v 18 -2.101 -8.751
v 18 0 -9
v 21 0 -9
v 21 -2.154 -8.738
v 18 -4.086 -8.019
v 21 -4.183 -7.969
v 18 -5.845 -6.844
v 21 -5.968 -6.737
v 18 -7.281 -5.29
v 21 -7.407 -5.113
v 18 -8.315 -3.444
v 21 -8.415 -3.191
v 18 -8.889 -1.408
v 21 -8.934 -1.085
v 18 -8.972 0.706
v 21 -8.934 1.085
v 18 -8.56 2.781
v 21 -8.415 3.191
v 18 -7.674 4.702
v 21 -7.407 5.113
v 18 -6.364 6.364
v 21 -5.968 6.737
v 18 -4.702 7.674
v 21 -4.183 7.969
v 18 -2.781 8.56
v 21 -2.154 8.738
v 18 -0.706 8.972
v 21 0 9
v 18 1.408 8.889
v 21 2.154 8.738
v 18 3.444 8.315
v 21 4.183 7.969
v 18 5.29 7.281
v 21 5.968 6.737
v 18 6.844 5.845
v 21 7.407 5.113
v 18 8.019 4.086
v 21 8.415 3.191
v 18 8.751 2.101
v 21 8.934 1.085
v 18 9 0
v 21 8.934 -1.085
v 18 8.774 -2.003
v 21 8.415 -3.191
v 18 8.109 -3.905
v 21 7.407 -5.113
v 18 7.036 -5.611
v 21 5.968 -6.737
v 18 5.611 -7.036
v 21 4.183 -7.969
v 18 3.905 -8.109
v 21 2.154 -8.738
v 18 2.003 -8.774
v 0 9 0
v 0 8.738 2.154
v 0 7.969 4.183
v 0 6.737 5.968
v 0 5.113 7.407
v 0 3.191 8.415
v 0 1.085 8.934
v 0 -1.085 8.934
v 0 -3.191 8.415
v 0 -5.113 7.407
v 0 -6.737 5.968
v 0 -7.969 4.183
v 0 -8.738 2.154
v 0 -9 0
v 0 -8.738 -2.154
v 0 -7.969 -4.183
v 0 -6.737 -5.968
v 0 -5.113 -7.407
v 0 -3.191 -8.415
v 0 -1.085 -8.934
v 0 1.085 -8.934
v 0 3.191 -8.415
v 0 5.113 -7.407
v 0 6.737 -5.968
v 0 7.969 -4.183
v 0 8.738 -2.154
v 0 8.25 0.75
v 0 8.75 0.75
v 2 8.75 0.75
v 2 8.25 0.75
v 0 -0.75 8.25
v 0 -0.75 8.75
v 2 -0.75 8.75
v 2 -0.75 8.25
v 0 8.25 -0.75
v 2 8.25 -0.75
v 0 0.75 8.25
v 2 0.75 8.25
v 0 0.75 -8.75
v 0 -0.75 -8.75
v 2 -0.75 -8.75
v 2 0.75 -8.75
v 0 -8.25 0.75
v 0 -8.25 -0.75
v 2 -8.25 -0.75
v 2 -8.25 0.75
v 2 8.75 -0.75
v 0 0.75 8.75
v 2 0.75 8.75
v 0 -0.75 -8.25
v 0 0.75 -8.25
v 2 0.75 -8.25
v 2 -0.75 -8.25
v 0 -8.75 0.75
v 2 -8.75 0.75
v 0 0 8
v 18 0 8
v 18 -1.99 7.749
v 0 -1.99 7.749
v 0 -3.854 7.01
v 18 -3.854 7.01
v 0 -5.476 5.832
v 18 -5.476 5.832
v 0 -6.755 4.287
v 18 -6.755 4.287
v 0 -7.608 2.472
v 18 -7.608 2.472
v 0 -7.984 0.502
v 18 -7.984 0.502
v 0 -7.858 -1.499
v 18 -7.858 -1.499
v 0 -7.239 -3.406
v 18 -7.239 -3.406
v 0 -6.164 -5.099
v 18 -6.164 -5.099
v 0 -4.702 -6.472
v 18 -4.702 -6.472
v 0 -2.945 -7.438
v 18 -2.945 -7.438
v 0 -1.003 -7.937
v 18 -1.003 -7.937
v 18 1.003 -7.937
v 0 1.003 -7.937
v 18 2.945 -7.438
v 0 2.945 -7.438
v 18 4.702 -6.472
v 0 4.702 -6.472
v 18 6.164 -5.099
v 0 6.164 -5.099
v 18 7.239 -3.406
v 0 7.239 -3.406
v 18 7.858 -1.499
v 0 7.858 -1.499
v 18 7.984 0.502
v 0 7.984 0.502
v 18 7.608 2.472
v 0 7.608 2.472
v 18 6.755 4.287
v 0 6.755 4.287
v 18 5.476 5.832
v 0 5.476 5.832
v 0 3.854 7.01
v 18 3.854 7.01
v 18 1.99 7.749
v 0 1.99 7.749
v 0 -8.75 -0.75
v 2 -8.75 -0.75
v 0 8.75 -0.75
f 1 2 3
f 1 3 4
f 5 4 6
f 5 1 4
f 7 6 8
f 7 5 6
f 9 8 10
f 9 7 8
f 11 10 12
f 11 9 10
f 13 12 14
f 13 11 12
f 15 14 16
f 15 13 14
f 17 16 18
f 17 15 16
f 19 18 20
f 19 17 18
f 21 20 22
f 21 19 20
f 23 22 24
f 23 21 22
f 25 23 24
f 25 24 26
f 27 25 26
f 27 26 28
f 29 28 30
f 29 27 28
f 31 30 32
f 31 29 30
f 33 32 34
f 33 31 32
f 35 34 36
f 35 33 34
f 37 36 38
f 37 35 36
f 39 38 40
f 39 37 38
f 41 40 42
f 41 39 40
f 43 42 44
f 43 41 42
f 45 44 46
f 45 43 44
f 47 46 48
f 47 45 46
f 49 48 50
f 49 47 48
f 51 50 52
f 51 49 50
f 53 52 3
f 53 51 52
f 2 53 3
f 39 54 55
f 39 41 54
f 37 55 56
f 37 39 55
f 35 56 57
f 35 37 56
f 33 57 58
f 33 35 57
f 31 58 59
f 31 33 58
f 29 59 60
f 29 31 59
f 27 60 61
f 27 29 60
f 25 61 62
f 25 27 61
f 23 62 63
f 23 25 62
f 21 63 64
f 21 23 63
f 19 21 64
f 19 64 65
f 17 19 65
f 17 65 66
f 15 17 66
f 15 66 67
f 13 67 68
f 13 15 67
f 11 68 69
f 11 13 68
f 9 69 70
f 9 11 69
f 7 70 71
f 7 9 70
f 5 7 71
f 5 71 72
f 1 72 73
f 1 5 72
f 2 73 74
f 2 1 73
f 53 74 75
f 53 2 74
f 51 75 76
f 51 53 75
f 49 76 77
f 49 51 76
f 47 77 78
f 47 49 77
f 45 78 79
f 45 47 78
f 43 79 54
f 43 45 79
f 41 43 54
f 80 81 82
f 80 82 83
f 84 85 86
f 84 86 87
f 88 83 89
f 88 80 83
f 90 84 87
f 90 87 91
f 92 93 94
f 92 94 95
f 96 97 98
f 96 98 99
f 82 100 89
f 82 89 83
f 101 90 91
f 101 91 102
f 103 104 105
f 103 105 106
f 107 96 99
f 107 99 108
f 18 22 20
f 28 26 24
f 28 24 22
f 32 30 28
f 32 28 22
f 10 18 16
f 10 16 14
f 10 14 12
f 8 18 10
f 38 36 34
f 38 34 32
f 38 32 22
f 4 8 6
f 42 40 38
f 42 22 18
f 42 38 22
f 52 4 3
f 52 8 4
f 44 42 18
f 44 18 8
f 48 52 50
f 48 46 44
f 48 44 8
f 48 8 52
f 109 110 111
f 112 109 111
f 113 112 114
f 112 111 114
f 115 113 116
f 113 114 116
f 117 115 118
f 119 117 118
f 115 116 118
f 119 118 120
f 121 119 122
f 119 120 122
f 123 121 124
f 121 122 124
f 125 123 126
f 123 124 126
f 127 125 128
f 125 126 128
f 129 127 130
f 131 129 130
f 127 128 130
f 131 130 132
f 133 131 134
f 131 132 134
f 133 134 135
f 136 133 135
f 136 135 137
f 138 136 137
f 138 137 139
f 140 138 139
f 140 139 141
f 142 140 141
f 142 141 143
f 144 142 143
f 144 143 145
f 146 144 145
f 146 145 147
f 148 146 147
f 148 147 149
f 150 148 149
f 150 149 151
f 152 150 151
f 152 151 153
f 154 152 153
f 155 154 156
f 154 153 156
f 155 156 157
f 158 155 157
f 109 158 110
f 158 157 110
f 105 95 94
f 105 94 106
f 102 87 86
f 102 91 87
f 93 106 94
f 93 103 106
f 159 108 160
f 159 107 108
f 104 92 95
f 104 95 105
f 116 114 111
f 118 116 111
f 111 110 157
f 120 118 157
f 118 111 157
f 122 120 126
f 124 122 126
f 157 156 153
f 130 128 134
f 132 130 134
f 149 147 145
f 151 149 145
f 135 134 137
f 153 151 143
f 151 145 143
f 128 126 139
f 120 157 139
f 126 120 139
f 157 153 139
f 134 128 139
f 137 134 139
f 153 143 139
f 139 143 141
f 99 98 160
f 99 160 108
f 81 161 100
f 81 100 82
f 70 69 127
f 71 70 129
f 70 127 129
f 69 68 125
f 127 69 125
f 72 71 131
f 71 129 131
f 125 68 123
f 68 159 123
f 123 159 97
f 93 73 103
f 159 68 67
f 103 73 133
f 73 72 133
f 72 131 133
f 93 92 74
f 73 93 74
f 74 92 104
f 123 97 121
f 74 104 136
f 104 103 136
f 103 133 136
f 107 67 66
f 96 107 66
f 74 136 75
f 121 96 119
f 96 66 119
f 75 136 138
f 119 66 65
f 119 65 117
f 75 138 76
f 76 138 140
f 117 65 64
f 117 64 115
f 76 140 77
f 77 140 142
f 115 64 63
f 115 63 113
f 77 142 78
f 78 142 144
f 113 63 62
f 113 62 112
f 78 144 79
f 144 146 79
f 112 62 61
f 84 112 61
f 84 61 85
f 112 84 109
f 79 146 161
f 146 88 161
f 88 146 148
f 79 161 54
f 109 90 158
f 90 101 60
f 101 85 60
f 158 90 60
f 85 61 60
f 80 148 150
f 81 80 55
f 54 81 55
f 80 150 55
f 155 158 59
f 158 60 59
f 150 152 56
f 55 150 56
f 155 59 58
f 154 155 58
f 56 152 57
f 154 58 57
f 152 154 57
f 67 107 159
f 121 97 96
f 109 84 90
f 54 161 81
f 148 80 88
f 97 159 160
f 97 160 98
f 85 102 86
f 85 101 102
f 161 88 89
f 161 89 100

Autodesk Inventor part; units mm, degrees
ref_plane "YZ Plane" through (0, 0, 0) normal (1, 0, 0) x (0, 1, 0)
ref_plane "XZ Plane" through (0, 0, 0) normal (0, 1, 0) x (-1, 0, 0)
ref_plane "XY Plane" through (0, 0, 0) normal (0, 0, 1) x (1, 0, 0)
sketch "Sketch1" plane through (0, 0, 0) normal (0, 0, 1) x (1, 0, 0)
  line L0 (0, 0) -> (18, 0)
  line L1 (0, 0) -> (0, 9)
  line L2 (0, 9) -> (18, 9)
  line L3 (18, 9) -> (18, 0)
  dimension "d2" = 18
revolve "Revolution1" add sketch "Sketch1" angle 360 about axis through (0, 0, 0) along (1, 0, 0)
sketch "Sketch2" plane through (0, 0, 0) normal (-1, 0, 0) x (0, 0, 1)
  circle A0 centre (0, 0) radius 8
  circle A1 centre (0, 0) radius 9 projected
  dimension "d4" = 18
  dimension "d5" = 16
hole "Hole1" at (0, 0, 0) direction (1, 0, 0) diameter 16 end through all
sketch "Sketch3" plane through (18, 0, 0) normal (1, 0, 0) x (0, 0, -1)
  circle A0 centre (0, 0) radius 9
  circle A1 centre (0, 0) radius 9 projected
  dimension "d13" = 18
  dimension "d14" = 18
extrude "Extrusion1" add sketch "Sketch3" along normal blind 3
sketch "Sketch4" plane through (0, 0, 0) normal (-1, 0, 0) x (0, 0, 1)
  circle A0 centre (0, 0) radius 9 projected
  circle A1 centre (0, 0) radius 8 projected
  circle A2 centre (0, 0) radius 8.5
  line L0 (0.75, -8.75) -> (-0.75, -8.75)
  line L1 (-0.75, -8.75) -> (-0.75, -8.25)
  line L2 (-0.75, -8.25) -> (0.75, -8.25)
  line L3 (0.75, -8.25) -> (0.75, -8.75)
  line L4 (8.25, -0.75) -> (8.25, 0.75)
  line L5 (8.75, -0.75) -> (8.25, -0.75)
  line L6 (8.75, 0.75) -> (8.75, -0.75)
  line L7 (8.25, 0.75) -> (8.75, 0.75)
  line L8 (0.75, 8.25) -> (-0.75, 8.25)
  line L9 (0.75, 8.75) -> (0.75, 8.25)
  line L10 (-0.75, 8.75) -> (0.75, 8.75)
  line L11 (-0.75, 8.25) -> (-0.75, 8.75)
  line L12 (-8.25, 0.75) -> (-8.25, -0.75)
  line L13 (-8.75, 0.75) -> (-8.25, 0.75)
  line L14 (-8.75, -0.75) -> (-8.75, 0.75)
  line L15 (-8.25, -0.75) -> (-8.75, -0.75)
  dimension "d17" = 18
  dimension "d18" = 17
  dimension "d19" = 0.5
  dimension "d20" = 1.5
  dimension "d21" = 0.25
  dimension "d22" = 0.75
  dimension "d26" = 360
extrude "Extrusion2" cut sketch "Sketch4" against normal blind 2 contours A2 L5 L4 L7 | A2 L7 L6 L5 | L9 L8 L11 A2 | A2 L11 L10 L9 | L3 L0 L1 A2 | A2 L1 L2 L3 | L13 L12 L15 A2 | A2 L15 L14 L13
equation "\"d6\" = d5"
equation "\"d13\" = d14"
properties part number "McCrea_dolny_kos_walle_MIR2" material "ABS Plastic"
